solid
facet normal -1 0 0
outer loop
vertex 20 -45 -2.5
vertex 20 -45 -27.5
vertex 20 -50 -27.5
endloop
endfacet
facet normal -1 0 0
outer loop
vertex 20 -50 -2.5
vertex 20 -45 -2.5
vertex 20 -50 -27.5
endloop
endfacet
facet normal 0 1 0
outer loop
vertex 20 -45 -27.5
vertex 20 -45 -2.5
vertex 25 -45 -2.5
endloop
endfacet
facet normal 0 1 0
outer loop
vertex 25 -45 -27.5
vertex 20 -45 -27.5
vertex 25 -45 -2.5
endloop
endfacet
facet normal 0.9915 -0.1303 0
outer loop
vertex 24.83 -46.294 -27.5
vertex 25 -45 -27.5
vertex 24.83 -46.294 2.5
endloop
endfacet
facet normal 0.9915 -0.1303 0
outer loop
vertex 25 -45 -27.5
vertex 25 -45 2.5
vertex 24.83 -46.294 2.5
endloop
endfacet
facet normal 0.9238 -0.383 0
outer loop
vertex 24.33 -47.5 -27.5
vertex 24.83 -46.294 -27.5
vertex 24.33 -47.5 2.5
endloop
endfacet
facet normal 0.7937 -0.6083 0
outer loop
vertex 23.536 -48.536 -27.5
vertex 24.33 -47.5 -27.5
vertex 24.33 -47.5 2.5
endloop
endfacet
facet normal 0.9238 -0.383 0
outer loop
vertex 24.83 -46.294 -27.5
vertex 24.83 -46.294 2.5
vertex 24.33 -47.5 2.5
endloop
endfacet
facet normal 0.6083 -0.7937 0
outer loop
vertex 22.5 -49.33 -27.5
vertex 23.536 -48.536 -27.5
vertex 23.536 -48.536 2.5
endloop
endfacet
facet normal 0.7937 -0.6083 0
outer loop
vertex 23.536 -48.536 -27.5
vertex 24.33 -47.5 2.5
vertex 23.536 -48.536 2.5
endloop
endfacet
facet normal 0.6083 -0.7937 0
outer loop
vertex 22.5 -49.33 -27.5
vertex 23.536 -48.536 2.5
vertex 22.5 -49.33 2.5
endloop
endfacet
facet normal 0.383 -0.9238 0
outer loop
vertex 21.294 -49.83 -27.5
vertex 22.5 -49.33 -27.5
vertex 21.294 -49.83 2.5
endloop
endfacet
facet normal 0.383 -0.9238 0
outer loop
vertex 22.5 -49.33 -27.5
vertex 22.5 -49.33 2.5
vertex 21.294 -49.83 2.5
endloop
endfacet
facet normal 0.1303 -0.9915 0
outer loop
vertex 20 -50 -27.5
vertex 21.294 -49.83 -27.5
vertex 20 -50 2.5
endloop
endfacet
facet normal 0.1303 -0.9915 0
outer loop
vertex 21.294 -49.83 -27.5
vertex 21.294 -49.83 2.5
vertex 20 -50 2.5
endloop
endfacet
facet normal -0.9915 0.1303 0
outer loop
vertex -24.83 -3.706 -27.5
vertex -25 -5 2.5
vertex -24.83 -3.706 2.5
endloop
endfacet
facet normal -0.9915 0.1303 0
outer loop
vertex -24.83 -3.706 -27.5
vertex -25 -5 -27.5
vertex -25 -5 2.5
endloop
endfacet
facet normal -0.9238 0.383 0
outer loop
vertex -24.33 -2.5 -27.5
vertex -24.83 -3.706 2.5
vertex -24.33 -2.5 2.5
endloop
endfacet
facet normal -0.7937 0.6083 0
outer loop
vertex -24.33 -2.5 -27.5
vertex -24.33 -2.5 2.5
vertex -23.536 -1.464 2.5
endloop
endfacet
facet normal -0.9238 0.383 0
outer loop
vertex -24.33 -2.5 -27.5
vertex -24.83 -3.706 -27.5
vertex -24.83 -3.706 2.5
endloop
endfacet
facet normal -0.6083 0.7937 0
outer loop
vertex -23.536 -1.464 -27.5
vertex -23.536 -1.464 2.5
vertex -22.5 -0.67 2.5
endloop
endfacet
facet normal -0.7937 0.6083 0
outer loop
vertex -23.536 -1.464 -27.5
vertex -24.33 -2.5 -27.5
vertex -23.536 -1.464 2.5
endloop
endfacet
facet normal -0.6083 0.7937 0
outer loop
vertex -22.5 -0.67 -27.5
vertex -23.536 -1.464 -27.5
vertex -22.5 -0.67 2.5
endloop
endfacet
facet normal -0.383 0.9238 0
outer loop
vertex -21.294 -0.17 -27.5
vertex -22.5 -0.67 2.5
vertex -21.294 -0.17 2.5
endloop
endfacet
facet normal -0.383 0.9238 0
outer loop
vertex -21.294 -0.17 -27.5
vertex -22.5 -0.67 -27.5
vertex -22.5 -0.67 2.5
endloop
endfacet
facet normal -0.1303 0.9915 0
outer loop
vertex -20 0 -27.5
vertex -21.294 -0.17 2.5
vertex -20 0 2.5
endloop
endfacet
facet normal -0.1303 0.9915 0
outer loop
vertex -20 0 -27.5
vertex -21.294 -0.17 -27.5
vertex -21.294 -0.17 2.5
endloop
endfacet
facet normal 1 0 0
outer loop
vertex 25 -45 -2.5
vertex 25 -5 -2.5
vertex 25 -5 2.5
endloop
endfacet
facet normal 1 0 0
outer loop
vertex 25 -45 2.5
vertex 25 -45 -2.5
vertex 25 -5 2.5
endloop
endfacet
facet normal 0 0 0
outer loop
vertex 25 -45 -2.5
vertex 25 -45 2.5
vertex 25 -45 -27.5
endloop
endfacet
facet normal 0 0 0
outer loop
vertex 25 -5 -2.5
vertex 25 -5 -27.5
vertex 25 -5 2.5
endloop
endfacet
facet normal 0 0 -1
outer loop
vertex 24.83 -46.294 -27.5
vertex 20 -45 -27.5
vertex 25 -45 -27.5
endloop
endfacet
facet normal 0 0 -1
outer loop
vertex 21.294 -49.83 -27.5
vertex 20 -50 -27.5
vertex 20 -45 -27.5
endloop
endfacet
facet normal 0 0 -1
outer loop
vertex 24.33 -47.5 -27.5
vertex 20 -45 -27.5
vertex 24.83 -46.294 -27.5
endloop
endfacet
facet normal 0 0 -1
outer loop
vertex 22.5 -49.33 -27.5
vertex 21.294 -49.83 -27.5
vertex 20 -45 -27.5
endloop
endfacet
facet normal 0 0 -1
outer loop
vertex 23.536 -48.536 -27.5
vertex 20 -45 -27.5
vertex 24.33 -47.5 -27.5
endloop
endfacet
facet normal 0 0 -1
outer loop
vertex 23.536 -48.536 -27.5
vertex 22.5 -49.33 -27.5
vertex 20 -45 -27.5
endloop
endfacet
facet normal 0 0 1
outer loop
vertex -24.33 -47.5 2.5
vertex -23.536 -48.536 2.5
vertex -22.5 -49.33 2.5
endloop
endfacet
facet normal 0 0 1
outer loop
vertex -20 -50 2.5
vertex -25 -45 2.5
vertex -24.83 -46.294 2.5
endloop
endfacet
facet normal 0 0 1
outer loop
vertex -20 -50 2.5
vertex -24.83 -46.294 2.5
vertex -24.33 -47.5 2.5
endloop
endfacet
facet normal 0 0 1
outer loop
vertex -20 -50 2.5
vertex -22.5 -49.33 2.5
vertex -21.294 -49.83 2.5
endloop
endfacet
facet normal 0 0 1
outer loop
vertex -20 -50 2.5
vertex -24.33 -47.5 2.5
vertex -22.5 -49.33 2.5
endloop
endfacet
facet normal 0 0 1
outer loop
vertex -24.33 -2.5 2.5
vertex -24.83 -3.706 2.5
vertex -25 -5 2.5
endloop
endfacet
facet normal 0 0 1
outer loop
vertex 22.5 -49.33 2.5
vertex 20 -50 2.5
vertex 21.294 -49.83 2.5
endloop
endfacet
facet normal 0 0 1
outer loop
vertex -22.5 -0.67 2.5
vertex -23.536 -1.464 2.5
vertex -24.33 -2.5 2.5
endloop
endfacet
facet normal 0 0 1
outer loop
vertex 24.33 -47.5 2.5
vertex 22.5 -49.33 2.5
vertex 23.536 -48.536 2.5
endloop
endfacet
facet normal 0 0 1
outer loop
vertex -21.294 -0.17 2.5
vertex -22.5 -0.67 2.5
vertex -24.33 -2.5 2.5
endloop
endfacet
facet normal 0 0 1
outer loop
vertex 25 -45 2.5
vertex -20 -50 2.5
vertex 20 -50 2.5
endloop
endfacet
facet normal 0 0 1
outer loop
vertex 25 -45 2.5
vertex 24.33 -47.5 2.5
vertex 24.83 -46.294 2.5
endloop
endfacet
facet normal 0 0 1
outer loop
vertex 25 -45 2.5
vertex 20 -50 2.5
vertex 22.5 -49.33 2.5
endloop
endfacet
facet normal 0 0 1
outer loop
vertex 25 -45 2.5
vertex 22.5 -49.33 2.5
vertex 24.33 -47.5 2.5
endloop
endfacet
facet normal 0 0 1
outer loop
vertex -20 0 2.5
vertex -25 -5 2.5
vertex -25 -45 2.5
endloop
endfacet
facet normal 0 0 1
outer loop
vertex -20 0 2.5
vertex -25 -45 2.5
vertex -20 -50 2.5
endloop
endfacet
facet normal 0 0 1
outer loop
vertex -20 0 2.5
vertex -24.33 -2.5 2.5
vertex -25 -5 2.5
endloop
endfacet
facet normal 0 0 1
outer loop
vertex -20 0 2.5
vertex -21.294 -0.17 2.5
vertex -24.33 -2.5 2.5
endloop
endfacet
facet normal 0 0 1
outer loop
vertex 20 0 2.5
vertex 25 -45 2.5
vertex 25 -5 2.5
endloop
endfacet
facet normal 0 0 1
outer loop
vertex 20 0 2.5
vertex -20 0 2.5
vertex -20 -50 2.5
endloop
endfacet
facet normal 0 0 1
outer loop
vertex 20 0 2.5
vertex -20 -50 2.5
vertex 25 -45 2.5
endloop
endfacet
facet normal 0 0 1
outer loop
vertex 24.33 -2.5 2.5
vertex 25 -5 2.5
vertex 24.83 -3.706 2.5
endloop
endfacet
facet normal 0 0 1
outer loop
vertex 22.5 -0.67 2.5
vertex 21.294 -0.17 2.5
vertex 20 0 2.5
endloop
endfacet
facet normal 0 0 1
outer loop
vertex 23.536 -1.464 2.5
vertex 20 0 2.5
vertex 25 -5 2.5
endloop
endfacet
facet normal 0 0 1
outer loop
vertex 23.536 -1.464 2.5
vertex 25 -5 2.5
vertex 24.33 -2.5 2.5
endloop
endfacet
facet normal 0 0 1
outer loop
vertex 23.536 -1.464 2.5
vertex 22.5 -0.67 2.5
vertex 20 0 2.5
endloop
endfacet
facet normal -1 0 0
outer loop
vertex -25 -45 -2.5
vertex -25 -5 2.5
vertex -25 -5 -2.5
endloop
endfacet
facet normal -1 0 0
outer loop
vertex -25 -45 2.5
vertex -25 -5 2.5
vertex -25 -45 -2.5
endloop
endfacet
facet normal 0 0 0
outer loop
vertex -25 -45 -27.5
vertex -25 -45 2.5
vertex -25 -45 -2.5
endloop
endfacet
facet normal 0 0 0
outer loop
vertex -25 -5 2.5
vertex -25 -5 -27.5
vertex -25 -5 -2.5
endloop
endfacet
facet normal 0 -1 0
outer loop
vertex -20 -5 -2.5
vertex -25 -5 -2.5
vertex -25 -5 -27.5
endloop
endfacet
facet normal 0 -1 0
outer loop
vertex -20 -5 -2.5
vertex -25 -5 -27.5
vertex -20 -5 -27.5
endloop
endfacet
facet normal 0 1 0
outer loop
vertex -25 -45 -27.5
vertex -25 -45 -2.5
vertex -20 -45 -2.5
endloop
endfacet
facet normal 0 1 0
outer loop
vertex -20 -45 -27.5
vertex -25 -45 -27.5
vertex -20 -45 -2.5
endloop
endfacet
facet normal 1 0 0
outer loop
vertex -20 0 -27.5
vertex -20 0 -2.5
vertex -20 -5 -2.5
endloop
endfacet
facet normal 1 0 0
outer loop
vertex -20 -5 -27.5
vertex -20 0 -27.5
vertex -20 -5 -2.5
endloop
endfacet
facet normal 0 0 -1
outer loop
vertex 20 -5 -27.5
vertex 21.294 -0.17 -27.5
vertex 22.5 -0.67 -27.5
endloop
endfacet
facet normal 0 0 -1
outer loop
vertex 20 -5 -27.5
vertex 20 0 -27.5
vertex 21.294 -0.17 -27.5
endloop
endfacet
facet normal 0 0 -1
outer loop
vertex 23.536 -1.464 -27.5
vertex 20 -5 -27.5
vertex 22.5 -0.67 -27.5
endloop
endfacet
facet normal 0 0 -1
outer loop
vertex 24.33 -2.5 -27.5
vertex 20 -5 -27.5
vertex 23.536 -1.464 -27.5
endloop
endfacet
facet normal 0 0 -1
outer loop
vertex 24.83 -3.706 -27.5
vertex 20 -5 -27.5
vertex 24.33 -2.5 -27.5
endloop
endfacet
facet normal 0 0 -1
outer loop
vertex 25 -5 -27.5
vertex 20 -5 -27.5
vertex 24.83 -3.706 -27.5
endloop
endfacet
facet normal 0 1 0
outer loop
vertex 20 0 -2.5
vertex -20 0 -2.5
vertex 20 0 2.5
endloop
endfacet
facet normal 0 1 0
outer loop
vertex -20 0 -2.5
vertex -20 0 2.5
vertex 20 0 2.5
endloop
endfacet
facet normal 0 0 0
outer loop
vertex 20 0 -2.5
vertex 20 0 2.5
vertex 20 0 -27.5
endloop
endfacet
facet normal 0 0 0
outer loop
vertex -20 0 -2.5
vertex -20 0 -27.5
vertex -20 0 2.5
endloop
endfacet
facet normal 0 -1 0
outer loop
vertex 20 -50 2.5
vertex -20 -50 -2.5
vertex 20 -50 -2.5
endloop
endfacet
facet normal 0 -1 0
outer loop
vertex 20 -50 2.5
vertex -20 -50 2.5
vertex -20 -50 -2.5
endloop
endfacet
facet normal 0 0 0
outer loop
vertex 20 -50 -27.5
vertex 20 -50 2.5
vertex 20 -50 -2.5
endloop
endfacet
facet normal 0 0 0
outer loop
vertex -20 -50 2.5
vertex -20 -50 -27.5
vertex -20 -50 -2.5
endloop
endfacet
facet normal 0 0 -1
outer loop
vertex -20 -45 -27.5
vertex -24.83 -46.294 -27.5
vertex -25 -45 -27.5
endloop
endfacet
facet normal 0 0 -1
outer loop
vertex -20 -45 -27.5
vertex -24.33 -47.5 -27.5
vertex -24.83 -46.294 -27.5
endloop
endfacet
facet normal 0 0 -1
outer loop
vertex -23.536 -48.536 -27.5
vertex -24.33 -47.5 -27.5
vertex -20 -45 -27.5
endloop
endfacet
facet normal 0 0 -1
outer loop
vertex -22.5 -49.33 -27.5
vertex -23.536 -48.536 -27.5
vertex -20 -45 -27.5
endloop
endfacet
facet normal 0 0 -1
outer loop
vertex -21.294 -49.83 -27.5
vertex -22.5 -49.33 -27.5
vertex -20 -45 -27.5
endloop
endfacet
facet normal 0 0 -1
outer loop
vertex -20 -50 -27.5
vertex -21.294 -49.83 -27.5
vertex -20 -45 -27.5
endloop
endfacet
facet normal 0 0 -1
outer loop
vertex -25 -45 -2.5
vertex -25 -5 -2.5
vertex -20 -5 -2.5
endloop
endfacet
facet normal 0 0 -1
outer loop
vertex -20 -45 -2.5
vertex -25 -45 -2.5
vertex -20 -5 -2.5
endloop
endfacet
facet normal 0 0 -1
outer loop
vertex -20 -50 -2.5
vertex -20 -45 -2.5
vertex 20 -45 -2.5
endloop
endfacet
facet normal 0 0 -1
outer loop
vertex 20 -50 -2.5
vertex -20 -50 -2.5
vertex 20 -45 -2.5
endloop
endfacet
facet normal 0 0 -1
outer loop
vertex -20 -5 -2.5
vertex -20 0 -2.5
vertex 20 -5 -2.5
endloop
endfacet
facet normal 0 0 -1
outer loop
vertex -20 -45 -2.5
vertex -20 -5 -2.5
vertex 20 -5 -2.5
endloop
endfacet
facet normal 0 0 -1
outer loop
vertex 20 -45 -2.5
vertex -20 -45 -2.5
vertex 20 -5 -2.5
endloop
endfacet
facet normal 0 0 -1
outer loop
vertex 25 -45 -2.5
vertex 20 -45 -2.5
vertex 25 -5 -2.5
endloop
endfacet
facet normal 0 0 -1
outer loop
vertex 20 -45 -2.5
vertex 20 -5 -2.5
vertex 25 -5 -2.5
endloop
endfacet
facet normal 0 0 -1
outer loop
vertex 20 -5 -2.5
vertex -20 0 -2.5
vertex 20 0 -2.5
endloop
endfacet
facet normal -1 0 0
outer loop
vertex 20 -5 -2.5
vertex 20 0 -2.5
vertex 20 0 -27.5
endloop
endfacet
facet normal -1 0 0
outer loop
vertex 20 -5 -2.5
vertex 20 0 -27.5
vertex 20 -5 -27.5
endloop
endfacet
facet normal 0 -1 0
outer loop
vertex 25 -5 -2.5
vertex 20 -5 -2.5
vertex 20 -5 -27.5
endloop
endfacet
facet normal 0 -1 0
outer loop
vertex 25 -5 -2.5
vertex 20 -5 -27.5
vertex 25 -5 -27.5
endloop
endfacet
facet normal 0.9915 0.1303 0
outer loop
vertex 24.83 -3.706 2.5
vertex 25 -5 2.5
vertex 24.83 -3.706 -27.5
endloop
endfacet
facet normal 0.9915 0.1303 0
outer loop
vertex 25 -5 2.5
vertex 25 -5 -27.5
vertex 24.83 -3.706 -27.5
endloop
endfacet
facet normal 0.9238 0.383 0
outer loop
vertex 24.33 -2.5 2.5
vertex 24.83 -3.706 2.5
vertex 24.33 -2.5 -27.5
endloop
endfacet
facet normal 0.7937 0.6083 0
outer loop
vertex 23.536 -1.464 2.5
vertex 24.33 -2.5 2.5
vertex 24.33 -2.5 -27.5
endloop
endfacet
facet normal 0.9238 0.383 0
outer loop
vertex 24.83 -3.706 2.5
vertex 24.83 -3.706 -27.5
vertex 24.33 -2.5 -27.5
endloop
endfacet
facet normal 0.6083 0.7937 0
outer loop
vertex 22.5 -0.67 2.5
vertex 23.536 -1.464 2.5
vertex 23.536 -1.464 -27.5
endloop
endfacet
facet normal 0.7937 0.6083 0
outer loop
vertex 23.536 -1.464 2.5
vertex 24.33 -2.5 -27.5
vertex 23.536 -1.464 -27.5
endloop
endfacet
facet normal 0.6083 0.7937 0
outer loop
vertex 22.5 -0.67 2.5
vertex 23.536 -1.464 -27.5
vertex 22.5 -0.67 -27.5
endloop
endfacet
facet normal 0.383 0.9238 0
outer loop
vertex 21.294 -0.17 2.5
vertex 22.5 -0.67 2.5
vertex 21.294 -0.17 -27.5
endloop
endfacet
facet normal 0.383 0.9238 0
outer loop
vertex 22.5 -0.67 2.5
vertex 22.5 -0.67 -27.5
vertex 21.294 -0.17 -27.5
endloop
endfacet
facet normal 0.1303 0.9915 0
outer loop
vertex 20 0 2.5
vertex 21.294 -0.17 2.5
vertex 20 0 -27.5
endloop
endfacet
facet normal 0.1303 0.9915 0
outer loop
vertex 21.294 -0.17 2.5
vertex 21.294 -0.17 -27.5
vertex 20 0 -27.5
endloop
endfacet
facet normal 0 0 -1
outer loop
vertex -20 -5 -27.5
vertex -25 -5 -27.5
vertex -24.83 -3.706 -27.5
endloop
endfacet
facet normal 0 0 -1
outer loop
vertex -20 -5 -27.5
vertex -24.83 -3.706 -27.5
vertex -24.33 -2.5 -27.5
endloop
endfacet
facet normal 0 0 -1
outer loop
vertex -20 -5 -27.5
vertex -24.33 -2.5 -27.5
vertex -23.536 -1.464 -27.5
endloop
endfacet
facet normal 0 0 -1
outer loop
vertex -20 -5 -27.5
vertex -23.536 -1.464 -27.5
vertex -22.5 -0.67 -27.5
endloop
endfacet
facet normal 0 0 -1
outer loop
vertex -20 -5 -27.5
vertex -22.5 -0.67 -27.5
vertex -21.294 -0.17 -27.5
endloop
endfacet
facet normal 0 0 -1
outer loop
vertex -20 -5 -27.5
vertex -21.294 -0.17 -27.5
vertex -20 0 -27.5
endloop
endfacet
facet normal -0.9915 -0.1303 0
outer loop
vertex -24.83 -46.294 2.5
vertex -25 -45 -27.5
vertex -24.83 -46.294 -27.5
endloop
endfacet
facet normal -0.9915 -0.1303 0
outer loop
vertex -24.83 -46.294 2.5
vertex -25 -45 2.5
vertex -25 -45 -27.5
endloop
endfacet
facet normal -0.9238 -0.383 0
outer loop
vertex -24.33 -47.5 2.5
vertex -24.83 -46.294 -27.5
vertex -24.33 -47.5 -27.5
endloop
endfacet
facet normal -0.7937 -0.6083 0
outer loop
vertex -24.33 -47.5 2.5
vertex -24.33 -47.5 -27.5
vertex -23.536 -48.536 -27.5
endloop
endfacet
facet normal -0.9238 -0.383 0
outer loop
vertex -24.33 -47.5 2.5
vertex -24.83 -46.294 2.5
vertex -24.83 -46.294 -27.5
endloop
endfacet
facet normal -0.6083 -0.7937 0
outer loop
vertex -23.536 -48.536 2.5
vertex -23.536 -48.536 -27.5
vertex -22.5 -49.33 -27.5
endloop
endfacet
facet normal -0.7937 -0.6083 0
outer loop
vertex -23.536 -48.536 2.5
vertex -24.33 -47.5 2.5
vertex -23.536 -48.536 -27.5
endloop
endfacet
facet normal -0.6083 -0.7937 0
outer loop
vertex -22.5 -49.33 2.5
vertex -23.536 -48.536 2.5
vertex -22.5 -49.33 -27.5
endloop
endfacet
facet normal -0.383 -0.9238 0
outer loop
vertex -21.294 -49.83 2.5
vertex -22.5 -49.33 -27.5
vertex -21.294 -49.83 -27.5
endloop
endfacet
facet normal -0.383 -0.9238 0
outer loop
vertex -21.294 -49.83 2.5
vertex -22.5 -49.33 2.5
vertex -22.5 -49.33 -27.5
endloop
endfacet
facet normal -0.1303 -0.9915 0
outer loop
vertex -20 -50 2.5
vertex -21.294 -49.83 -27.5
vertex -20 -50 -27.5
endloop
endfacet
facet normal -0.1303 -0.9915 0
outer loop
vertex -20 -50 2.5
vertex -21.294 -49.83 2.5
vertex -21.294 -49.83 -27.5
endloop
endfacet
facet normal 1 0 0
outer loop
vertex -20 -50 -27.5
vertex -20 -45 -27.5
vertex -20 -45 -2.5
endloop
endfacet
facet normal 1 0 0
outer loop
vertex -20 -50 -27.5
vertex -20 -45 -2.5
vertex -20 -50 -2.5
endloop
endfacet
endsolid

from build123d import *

# Parameters (mm, degrees)
F0_W     = 50
F0_H     = 5
F1_DEPTH = 50
F2_W     = 5
F2_H     = 5.0000017802
F2_H_2   = 5
F3_DEPTH = 25
F4_R     = 4.99999


# Not quite as in the source:
# - a fillet or chamfer is up to 0.001 mm smaller than in the source, because OpenCascade refuses the exact size


with BuildPart() as f1:
    # F0 (on Front) → F1 (new body)
    with BuildSketch(Plane.XZ):
        Rectangle(F0_W, F0_H)
    extrude(amount=F1_DEPTH)

    # F2 (on face) → F3 (join)
    with BuildSketch(Plane(origin=(0, 0, -2.5), x_dir=(1, 0, 0), z_dir=(0, 0, -1))):
        with Locations((-22.5, 47.4999991099)):
            Rectangle(F2_W, F2_H)
        with Locations((22.5, 47.4999991099)):
            Rectangle(F2_W, F2_H)
        with Locations((22.5, 2.5)):
            Rectangle(F2_W, F2_H_2)
        with Locations((-22.5, 2.5)):
            Rectangle(F2_W, F2_H_2)
    extrude(amount=F3_DEPTH)

    # F4 (radius 5 in the source; OpenCascade refuses exactly that, so slightly less here)
    f4_edges = [f1.edges().sort_by_distance(p)[0] for p in [
        (-25, -50, -12.5),
        (25, -50, -12.5),
        (25, 0, -12.5),
        (-25, 0, -12.5),
    ]]
    fillet(f4_edges, radius=F4_R)


solid = f1.part
